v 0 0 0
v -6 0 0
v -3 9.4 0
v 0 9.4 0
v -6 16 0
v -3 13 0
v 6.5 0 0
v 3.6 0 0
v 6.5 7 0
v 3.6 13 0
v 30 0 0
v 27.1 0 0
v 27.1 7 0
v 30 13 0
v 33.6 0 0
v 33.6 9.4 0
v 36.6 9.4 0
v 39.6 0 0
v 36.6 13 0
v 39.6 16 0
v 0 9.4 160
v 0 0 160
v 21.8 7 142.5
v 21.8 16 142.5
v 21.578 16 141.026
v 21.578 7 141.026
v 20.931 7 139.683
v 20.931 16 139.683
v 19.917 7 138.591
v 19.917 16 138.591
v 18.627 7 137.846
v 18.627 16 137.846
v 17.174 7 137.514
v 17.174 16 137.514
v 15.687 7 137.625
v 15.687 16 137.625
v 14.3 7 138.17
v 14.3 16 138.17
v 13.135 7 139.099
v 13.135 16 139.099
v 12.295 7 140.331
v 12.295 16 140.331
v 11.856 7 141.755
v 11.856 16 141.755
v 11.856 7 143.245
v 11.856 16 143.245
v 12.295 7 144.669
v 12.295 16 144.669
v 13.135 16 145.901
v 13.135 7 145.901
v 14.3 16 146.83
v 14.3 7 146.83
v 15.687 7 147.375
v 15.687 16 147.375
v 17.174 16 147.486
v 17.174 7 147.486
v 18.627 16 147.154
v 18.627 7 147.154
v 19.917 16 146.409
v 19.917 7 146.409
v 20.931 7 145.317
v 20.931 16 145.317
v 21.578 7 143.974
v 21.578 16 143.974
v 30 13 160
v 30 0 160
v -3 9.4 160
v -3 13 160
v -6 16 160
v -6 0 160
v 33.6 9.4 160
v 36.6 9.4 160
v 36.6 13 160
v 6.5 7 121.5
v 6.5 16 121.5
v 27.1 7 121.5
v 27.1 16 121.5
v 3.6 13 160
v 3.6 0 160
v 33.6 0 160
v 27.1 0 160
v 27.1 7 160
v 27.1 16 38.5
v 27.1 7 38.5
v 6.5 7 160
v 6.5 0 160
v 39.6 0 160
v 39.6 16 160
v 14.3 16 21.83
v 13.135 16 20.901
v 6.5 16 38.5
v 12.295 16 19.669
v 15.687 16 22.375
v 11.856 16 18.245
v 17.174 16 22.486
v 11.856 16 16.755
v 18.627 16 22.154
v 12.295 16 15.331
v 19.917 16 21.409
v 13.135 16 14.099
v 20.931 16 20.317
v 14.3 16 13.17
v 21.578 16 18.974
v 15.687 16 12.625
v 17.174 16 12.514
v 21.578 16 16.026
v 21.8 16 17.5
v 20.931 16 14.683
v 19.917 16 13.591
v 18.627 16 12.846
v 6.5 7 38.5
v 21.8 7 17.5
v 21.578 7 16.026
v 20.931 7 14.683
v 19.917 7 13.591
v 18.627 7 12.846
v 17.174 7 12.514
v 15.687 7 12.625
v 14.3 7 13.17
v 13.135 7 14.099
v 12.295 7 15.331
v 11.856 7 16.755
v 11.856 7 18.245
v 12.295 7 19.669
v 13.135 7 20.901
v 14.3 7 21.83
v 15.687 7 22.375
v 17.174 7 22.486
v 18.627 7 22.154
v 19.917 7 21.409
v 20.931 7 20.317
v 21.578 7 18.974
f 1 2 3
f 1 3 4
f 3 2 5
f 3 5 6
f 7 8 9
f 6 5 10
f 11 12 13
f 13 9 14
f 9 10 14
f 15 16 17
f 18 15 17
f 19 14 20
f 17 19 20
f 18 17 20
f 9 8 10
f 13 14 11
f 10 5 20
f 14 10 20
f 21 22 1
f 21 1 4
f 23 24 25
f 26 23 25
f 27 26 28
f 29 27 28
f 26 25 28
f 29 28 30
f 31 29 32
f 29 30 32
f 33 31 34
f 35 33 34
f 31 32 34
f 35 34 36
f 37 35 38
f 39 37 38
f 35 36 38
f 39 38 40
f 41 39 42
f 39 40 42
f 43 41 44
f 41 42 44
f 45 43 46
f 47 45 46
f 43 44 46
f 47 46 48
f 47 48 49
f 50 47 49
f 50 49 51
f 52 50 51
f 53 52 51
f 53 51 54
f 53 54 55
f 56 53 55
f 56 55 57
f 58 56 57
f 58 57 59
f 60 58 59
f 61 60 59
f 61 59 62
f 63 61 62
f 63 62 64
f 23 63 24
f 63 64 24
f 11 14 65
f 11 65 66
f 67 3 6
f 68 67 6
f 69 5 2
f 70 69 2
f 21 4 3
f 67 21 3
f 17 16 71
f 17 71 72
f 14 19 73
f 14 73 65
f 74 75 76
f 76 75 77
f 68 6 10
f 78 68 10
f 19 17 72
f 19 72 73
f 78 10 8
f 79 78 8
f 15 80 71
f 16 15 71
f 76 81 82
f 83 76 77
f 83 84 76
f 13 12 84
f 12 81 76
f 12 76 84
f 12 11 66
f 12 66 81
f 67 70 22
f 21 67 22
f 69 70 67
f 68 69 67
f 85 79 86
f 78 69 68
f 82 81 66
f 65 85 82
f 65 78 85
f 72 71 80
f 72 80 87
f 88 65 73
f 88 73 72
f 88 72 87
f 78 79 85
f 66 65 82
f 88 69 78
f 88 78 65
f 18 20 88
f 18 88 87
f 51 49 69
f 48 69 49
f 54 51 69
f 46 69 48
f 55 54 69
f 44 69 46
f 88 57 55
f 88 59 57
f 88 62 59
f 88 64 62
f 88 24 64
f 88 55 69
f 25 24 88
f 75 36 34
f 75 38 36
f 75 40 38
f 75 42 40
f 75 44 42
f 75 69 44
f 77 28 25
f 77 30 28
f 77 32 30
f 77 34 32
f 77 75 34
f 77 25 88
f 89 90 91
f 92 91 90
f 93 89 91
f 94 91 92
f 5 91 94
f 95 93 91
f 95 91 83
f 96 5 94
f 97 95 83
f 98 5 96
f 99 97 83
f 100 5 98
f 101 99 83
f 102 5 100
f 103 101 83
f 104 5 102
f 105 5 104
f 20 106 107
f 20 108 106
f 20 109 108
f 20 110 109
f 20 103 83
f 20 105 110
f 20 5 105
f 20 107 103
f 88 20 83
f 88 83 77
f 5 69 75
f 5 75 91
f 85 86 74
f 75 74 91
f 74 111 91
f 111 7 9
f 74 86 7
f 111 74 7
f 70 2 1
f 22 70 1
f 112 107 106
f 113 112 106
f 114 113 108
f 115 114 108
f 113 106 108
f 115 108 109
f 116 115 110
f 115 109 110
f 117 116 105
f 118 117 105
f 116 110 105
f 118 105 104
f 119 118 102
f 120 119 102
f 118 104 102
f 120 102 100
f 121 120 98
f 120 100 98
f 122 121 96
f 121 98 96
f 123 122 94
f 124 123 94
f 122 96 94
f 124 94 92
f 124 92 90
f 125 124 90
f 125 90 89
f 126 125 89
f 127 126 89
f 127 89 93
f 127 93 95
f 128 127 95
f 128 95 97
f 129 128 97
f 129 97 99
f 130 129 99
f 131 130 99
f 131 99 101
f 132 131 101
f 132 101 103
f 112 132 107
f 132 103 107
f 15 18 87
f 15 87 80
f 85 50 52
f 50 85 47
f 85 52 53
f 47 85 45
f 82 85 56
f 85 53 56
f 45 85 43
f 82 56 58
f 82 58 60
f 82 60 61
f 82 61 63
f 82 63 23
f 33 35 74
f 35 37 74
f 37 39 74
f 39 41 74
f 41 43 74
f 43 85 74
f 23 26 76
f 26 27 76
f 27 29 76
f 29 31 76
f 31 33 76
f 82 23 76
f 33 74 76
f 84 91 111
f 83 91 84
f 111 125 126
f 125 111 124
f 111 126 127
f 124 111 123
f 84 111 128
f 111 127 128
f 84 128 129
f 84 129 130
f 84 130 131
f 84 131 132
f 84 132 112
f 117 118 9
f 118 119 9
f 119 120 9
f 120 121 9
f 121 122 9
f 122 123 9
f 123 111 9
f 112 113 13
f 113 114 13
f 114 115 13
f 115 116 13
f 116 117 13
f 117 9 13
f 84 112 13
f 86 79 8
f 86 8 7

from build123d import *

# Parameters (mm, degrees)
BOSS_EXTRUDE1_DEPTH   = 160
BOSS_EXTRUDE1_2_DEPTH = 160
BOSS_EXTRUDE2_START   = 16
SKETCH3_W             = 20.6
SKETCH3_H             = 160
BOSS_EXTRUDE2_DEPTH   = 9
CUT_EXTRUDE1_START    = 16
SKETCH4_R             = 5
CUT_EXTRUDE1_DEPTH    = 9
CUT_EXTRUDE2_START    = 16
SKETCH5_W             = 20.6
SKETCH5_H             = 83
CUT_EXTRUDE2_DEPTH    = 9


with BuildPart() as part:
    # Sketch2 → Boss-Extrude1 (new body)
    with BuildSketch(Plane.XY):
        Polygon((0, 0), (0, 9.4), (-3, 9.4), (-3, 13), (3.6, 13), (3.6, 0), (6.5, 0), (6.5, 16), (-6, 16), (-6, 0), align=None)
    extrude(amount=BOSS_EXTRUDE1_DEPTH)



with BuildPart() as body_2:
    # Sketch2 → Boss-Extrude1 2 (new body)
    with BuildSketch(Plane.XY):
        Polygon((39.6, 0), (33.6, 0), (33.6, 9.4), (36.6, 9.4), (36.6, 13), (30, 13), (30, 0), (27.1, 0), (27.1, 16), (39.6, 16), align=None)
    extrude(amount=BOSS_EXTRUDE1_2_DEPTH)


with BuildPart() as part_1:
    add(part.part)

    add(body_2.part)  # Boss-Extrude2 merges body 2
    # Sketch3 → Boss-Extrude2 (add)
    with BuildSketch(Plane(origin=(0, 0, 0), x_dir=(1, 0, 0), z_dir=(0, 1, 0)).offset(BOSS_EXTRUDE2_START)):
        with Locations((16.8, -80)):
            Rectangle(SKETCH3_W, SKETCH3_H)
    extrude(amount=-BOSS_EXTRUDE2_DEPTH)

    # Sketch4 → Cut-Extrude1 (cut)
    with BuildSketch(Plane(origin=(0, 0, 0), x_dir=(1, 0, 0), z_dir=(0, 1, 0)).offset(CUT_EXTRUDE1_START)):
        with Locations((16.8, -17.5)):
            Circle(SKETCH4_R)
        with Locations((16.8, -142.5)):
            Circle(SKETCH4_R)
    extrude(amount=-CUT_EXTRUDE1_DEPTH, mode=Mode.SUBTRACT)

    # Sketch5 → Cut-Extrude2 (cut)
    with BuildSketch(Plane(origin=(0, 0, 0), x_dir=(1, 0, 0), z_dir=(0, 1, 0)).offset(CUT_EXTRUDE2_START)):
        with Locations((16.8, -80)):
            Rectangle(SKETCH5_W, SKETCH5_H)
    extrude(amount=-CUT_EXTRUDE2_DEPTH, mode=Mode.SUBTRACT)


solid = part_1.part
